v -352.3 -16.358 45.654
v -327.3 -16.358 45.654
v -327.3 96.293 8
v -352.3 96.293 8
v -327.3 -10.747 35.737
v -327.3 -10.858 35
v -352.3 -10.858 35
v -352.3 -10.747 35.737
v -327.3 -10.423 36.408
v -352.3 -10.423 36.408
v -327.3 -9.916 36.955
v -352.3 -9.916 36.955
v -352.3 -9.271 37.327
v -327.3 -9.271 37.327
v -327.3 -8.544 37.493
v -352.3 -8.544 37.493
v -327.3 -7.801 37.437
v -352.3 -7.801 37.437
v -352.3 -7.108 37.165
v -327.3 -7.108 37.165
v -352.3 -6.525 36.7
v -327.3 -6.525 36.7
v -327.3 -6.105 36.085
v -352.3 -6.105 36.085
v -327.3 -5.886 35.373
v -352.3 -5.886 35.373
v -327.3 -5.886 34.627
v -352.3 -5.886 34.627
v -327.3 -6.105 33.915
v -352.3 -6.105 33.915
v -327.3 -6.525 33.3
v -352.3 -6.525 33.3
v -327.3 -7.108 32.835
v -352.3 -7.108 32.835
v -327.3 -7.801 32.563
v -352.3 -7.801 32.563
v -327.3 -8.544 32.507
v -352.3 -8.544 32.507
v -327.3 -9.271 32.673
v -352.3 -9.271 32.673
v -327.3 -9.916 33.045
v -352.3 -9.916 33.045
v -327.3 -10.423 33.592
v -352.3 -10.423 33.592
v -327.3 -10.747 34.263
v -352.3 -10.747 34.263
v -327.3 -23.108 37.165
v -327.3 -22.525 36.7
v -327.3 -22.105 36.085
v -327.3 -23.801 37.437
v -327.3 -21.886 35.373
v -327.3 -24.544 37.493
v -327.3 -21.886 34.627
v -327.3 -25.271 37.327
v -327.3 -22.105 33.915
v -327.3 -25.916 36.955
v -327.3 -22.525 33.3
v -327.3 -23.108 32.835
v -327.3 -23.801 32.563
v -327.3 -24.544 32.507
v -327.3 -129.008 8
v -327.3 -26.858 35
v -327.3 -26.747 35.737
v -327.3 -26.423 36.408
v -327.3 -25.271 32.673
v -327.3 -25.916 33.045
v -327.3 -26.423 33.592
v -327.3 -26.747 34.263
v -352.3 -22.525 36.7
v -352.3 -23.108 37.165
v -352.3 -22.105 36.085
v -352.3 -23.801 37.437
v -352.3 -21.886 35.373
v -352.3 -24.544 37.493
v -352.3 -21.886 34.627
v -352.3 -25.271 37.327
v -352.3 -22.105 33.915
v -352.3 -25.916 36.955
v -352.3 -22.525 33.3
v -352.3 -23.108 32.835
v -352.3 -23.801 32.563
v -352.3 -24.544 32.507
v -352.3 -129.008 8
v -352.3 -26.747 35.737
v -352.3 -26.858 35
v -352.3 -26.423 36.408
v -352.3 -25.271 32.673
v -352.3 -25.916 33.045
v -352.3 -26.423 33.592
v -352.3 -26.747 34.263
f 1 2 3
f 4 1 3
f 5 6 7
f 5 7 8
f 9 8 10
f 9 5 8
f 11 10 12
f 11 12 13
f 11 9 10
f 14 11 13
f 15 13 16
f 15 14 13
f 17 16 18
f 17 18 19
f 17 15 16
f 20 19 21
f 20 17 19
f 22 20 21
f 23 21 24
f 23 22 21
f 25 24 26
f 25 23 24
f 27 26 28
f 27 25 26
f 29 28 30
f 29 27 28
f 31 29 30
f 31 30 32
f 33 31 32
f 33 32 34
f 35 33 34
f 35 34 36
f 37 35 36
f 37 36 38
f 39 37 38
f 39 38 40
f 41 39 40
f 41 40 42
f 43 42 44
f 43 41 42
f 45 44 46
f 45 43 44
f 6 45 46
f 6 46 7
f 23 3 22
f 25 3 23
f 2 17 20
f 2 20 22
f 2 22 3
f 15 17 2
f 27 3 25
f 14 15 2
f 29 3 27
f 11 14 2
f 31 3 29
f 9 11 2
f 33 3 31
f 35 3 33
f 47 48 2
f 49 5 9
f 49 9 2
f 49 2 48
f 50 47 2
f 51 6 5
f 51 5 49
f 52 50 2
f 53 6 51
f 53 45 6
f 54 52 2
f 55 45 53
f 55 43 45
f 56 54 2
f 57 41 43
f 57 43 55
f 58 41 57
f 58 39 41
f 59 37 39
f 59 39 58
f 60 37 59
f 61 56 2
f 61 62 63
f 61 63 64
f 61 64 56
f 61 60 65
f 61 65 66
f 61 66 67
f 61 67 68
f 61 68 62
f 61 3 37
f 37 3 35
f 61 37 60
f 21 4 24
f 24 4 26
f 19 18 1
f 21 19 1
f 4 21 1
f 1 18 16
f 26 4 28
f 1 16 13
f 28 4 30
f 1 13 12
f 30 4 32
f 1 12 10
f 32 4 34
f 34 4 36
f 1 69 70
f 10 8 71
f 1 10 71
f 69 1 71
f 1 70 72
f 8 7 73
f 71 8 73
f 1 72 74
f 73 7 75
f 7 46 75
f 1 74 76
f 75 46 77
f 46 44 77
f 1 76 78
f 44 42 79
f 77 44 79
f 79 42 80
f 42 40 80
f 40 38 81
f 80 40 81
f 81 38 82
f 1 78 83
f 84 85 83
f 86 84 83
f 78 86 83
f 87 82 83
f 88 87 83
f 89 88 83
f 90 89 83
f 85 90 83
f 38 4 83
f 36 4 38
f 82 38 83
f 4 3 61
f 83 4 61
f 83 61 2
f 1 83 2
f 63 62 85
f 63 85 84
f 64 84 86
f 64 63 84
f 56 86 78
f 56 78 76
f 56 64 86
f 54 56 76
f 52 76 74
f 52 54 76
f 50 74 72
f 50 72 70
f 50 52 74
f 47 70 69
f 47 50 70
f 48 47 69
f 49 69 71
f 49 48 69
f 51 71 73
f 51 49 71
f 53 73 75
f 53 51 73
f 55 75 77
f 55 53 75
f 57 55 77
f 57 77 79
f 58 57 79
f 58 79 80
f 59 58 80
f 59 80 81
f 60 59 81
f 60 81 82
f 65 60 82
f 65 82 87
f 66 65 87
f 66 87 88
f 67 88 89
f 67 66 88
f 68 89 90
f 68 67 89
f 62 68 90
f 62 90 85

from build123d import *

# Parameters (mm, degrees)
F1_DEPTH  = 8
F3_DEPTH  = 621.7
F4_DEPTH  = 5.5
F7_DEPTH  = 5.5
F9_DEPTH  = 5.5
F11_DEPTH = 5.5
F13_DEPTH = 5.5
F15_DEPTH = 5.5
F17_DEPTH = 308.2
F18_DEPTH = 24
F20_DEPTH = 244.2
F21_DEPTH = 30.35
F22_R     = 2.5
F23_DEPTH = 0.5
F24_R     = 2.5
F25_DEPTH = 0.5
F26_R     = 2.5
F27_DEPTH = 0.5
F28_R     = 2.5
F29_DEPTH = 0.5
F30_W     = 14.1428571429
F30_H     = 18
F30_W_2   = 4.1785714286
F30_H_2   = 6.1071428571
F31_DEPTH = 0.5
F32_DEPTH = 25
F34_DEPTH = 8


# Not quite as in the source:
# - a feature of the source that left no trace in its solid (it failed there, or was rolled back) is left out


with BuildPart() as f1:
    # F0 (on Top) → F1 (new body)
    with BuildSketch(Plane.XY):
        Polygon((-327.3, 108.1424002851), (-327.3, -140.8575997149), (-102.6, -140.8575997149), (-102.6, -170.8575997149), (0, -170.8575997149), (0, -140.8575997149), (288.9, -140.8575997149), (288.9, 108.1424002851), (0, 108.1424002851), (0, 138.1424002851), (-102.6, 128.6424002851), (-102.6, 108.1424002851), align=None)
    extrude(amount=F1_DEPTH)

    # F2 (on face) → F3 (join)
    with BuildSketch(Plane.YZ.offset(288.9)):
        Polygon((-16.3575997149, 51.4532495908), (-146.3575997149, 8), (-140.8575997149, 8), (108.1424002851, 8), (113.6424002851, 8), align=None)
    extrude(amount=-F3_DEPTH)

    # F2 (on face) → F4 (join)
    with BuildSketch(Plane.YZ.offset(288.9)):
        Polygon((-16.3575997149, 51.4532495908), (-146.3575997149, 8), (113.6424002851, 8), align=None)
    extrude(amount=F4_DEPTH)

    # F5 (on face) → F7 (join)
    with BuildSketch(Plane.XZ.offset(170.8575997149)):
        Polygon((-51.3, 62.75), (-108.1, 8), (5.5, 8), align=None)
    extrude(amount=F7_DEPTH)

    # F8 (on face) → F9 (cut)
    with BuildSketch(Plane(origin=(-13.187163576, 142.4213666207, 0), x_dir=(-0.9957406741, -0.0921982106, 0), z_dir=(-0.0921982106, 0.9957406741, 0))):
        Polygon((91.8565413643, 4.3927081219), (38.2758658123, 55.8195932448), (-15.3048097397, 4.3927081219), align=None)
    extrude(amount=-F9_DEPTH, mode=Mode.SUBTRACT)

    # F10 (on face) → F11 (cut)
    with BuildSketch(Plane(origin=(-332.8, 0, 0), x_dir=(0, -1, 0), z_dir=(-1, 0, 0))):
        Polygon((144.6140170728, 2.7836871671), (16.3575997149, 45.6541342062), (-111.8988176431, 2.7836871671), align=None)
    extrude(amount=-F11_DEPTH, mode=Mode.SUBTRACT)

    # F12 (on face) → F13 (cut)
    with BuildSketch(Plane.YZ.offset(294.4)):
        Polygon((111.8988176431, 2.7836871671), (-16.3575997149, 45.6541342062), (-144.6140170728, 2.7836871671), align=None)
    extrude(amount=-F13_DEPTH, mode=Mode.SUBTRACT)

    # F14 (on face) → F15 (cut)
    with BuildSketch(Plane.XZ.offset(176.3575997149)):
        Polygon((1.6830285492, 4.0401099834), (-51.3, 55.1108989459), (-104.2830285492, 4.0401099834), align=None)
    extrude(amount=-F15_DEPTH, mode=Mode.SUBTRACT)

    # F16 (on face) → F17 (join)
    with BuildSketch(Plane.YZ.offset(294.4)):
        Polygon((-37.9123742622, 48.4659791319), (-36.6443145321, 44.6722981882), (-16.3575997149, 51.4532495908), (3.9291151024, 44.6722981882), (5.1971748325, 48.4659791319), (-16.3575997149, 55.670786811), align=None)
    extrude(amount=-F17_DEPTH)

    # F16 (on face) → F18 (cut)
    with BuildSketch(Plane.YZ.offset(294.4)):
        Polygon((-37.9123742622, 48.4659791319), (-36.6443145321, 44.6722981882), (-16.3575997149, 51.4532495908), (3.9291151024, 44.6722981882), (5.1971748325, 48.4659791319), (-16.3575997149, 55.670786811), align=None)
    extrude(amount=-F18_DEPTH, mode=Mode.SUBTRACT)

    # F19 (on face) → F20 (join)
    with BuildSketch(Plane(origin=(-332.8, 0, 0), x_dir=(0, -1, 0), z_dir=(-1, 0, 0))):
        Polygon((-5.1971748325, 48.4659791319), (-3.9291151024, 44.6722981882), (16.3575997149, 51.4532495908), (36.6443145321, 44.6722981882), (37.9123742622, 48.4659791319), (16.3575997149, 55.670786811), align=None)
    extrude(amount=-F20_DEPTH)

    # F19 (on face) → F21 (cut)
    with BuildSketch(Plane(origin=(-332.8, 0, 0), x_dir=(0, -1, 0), z_dir=(-1, 0, 0))):
        Polygon((-5.1971748325, 48.4659791319), (-3.9291151024, 44.6722981882), (16.3575997149, 51.4532495908), (36.6443145321, 44.6722981882), (37.9123742622, 48.4659791319), (16.3575997149, 55.670786811), align=None)
    extrude(amount=-F21_DEPTH, mode=Mode.SUBTRACT)

    # F22 (on face) → F23 (cut)
    with BuildSketch(Plane(origin=(-327.3, 0, 0), x_dir=(0, -1, 0), z_dir=(-1, 0, 0))):
        with Locations((8.3575997149, 35)):
            Circle(F22_R)
        with Locations((24.3575997149, 35)):
            Circle(F22_R)
    extrude(amount=-F23_DEPTH, mode=Mode.SUBTRACT)

    # F24 (on face) → F25 (cut)
    with BuildSketch(Plane.YZ.offset(288.9)):
        with Locations((-24.3575997149, 35)):
            Circle(F24_R)
        with Locations((-8.3575997149, 35)):
            Circle(F24_R)
    extrude(amount=-F25_DEPTH, mode=Mode.SUBTRACT)

    # F26 (on face) → F27 (cut)
    with BuildSketch(Plane.XZ.offset(170.8575997149)):
        with Locations((-59.3, 35)):
            Circle(F26_R)
        with Locations((-43.3, 35)):
            Circle(F26_R)
    extrude(amount=-F27_DEPTH, mode=Mode.SUBTRACT)

    # F28 (on face) → F29 (cut)
    with BuildSketch(Plane(origin=(-12.6822332802, 136.9681194259, 0), x_dir=(-0.9957406741, -0.0921982106, 0), z_dir=(-0.0921982106, 0.9957406741, 0))):
        with Locations((30.7829559704, 35)):
            Circle(F28_R)
        with Locations((46.7829559704, 35)):
            Circle(F28_R)
    extrude(amount=-F29_DEPTH, mode=Mode.SUBTRACT)

    # F30 (on face) → F31 (cut)
    with BuildSketch(Plane.YZ.offset(288.9)):
        with Locations((-16.3575997149, 14)):
            Rectangle(F30_W, F30_H)
        with Locations((-19.4111711434, 9.9821428571)):
            Rectangle(F30_W_2, F30_H_2, mode=Mode.SUBTRACT)
        with Locations((-13.3040282863, 9.9821428571)):
            Rectangle(F30_W_2, F30_H_2, mode=Mode.SUBTRACT)
        with Locations((-19.4111711434, 18.0178571429)):
            Rectangle(F30_W_2, F30_H_2, mode=Mode.SUBTRACT)
        with Locations((-13.3040282863, 18.0178571429)):
            Rectangle(F30_W_2, F30_H_2, mode=Mode.SUBTRACT)
        with Locations((18.6424002851, 14)):
            Rectangle(F30_W, F30_H)
        with Locations((15.5888288566, 9.9821428571)):
            Rectangle(F30_W_2, F30_H_2, mode=Mode.SUBTRACT)
        with Locations((21.6959717137, 9.9821428571)):
            Rectangle(F30_W_2, F30_H_2, mode=Mode.SUBTRACT)
        with Locations((15.5888288566, 18.0178571429)):
            Rectangle(F30_W_2, F30_H_2, mode=Mode.SUBTRACT)
        with Locations((21.6959717137, 18.0178571429)):
            Rectangle(F30_W_2, F30_H_2, mode=Mode.SUBTRACT)
        with Locations((-51.3575997149, 14)):
            Rectangle(F30_W, F30_H)
        with Locations((-54.4111711434, 9.9821428571)):
            Rectangle(F30_W_2, F30_H_2, mode=Mode.SUBTRACT)
        with Locations((-48.3040282863, 9.9821428571)):
            Rectangle(F30_W_2, F30_H_2, mode=Mode.SUBTRACT)
        with Locations((-54.4111711434, 18.0178571429)):
            Rectangle(F30_W_2, F30_H_2, mode=Mode.SUBTRACT)
        with Locations((-48.3040282863, 18.0178571429)):
            Rectangle(F30_W_2, F30_H_2, mode=Mode.SUBTRACT)
    extrude(amount=-F31_DEPTH, mode=Mode.SUBTRACT)


with BuildPart() as f32:
    # F32 (new): a face of the model
    f32_faces = [f1.part.faces().sort_by_distance(p)[0] for p in [
        (-327.3, -16.3575997149, 15.1372563079),
    ]]
    extrude(f32_faces, amount=F32_DEPTH)

    # F34 (cut): a face of the model
    f34_faces = [f32.faces().sort_by_distance(p)[0] for p in [
        (-339.8, -16.3575997149, 0),
    ]]
    extrude(f34_faces, amount=-F34_DEPTH, mode=Mode.SUBTRACT)


solid = f32.part
